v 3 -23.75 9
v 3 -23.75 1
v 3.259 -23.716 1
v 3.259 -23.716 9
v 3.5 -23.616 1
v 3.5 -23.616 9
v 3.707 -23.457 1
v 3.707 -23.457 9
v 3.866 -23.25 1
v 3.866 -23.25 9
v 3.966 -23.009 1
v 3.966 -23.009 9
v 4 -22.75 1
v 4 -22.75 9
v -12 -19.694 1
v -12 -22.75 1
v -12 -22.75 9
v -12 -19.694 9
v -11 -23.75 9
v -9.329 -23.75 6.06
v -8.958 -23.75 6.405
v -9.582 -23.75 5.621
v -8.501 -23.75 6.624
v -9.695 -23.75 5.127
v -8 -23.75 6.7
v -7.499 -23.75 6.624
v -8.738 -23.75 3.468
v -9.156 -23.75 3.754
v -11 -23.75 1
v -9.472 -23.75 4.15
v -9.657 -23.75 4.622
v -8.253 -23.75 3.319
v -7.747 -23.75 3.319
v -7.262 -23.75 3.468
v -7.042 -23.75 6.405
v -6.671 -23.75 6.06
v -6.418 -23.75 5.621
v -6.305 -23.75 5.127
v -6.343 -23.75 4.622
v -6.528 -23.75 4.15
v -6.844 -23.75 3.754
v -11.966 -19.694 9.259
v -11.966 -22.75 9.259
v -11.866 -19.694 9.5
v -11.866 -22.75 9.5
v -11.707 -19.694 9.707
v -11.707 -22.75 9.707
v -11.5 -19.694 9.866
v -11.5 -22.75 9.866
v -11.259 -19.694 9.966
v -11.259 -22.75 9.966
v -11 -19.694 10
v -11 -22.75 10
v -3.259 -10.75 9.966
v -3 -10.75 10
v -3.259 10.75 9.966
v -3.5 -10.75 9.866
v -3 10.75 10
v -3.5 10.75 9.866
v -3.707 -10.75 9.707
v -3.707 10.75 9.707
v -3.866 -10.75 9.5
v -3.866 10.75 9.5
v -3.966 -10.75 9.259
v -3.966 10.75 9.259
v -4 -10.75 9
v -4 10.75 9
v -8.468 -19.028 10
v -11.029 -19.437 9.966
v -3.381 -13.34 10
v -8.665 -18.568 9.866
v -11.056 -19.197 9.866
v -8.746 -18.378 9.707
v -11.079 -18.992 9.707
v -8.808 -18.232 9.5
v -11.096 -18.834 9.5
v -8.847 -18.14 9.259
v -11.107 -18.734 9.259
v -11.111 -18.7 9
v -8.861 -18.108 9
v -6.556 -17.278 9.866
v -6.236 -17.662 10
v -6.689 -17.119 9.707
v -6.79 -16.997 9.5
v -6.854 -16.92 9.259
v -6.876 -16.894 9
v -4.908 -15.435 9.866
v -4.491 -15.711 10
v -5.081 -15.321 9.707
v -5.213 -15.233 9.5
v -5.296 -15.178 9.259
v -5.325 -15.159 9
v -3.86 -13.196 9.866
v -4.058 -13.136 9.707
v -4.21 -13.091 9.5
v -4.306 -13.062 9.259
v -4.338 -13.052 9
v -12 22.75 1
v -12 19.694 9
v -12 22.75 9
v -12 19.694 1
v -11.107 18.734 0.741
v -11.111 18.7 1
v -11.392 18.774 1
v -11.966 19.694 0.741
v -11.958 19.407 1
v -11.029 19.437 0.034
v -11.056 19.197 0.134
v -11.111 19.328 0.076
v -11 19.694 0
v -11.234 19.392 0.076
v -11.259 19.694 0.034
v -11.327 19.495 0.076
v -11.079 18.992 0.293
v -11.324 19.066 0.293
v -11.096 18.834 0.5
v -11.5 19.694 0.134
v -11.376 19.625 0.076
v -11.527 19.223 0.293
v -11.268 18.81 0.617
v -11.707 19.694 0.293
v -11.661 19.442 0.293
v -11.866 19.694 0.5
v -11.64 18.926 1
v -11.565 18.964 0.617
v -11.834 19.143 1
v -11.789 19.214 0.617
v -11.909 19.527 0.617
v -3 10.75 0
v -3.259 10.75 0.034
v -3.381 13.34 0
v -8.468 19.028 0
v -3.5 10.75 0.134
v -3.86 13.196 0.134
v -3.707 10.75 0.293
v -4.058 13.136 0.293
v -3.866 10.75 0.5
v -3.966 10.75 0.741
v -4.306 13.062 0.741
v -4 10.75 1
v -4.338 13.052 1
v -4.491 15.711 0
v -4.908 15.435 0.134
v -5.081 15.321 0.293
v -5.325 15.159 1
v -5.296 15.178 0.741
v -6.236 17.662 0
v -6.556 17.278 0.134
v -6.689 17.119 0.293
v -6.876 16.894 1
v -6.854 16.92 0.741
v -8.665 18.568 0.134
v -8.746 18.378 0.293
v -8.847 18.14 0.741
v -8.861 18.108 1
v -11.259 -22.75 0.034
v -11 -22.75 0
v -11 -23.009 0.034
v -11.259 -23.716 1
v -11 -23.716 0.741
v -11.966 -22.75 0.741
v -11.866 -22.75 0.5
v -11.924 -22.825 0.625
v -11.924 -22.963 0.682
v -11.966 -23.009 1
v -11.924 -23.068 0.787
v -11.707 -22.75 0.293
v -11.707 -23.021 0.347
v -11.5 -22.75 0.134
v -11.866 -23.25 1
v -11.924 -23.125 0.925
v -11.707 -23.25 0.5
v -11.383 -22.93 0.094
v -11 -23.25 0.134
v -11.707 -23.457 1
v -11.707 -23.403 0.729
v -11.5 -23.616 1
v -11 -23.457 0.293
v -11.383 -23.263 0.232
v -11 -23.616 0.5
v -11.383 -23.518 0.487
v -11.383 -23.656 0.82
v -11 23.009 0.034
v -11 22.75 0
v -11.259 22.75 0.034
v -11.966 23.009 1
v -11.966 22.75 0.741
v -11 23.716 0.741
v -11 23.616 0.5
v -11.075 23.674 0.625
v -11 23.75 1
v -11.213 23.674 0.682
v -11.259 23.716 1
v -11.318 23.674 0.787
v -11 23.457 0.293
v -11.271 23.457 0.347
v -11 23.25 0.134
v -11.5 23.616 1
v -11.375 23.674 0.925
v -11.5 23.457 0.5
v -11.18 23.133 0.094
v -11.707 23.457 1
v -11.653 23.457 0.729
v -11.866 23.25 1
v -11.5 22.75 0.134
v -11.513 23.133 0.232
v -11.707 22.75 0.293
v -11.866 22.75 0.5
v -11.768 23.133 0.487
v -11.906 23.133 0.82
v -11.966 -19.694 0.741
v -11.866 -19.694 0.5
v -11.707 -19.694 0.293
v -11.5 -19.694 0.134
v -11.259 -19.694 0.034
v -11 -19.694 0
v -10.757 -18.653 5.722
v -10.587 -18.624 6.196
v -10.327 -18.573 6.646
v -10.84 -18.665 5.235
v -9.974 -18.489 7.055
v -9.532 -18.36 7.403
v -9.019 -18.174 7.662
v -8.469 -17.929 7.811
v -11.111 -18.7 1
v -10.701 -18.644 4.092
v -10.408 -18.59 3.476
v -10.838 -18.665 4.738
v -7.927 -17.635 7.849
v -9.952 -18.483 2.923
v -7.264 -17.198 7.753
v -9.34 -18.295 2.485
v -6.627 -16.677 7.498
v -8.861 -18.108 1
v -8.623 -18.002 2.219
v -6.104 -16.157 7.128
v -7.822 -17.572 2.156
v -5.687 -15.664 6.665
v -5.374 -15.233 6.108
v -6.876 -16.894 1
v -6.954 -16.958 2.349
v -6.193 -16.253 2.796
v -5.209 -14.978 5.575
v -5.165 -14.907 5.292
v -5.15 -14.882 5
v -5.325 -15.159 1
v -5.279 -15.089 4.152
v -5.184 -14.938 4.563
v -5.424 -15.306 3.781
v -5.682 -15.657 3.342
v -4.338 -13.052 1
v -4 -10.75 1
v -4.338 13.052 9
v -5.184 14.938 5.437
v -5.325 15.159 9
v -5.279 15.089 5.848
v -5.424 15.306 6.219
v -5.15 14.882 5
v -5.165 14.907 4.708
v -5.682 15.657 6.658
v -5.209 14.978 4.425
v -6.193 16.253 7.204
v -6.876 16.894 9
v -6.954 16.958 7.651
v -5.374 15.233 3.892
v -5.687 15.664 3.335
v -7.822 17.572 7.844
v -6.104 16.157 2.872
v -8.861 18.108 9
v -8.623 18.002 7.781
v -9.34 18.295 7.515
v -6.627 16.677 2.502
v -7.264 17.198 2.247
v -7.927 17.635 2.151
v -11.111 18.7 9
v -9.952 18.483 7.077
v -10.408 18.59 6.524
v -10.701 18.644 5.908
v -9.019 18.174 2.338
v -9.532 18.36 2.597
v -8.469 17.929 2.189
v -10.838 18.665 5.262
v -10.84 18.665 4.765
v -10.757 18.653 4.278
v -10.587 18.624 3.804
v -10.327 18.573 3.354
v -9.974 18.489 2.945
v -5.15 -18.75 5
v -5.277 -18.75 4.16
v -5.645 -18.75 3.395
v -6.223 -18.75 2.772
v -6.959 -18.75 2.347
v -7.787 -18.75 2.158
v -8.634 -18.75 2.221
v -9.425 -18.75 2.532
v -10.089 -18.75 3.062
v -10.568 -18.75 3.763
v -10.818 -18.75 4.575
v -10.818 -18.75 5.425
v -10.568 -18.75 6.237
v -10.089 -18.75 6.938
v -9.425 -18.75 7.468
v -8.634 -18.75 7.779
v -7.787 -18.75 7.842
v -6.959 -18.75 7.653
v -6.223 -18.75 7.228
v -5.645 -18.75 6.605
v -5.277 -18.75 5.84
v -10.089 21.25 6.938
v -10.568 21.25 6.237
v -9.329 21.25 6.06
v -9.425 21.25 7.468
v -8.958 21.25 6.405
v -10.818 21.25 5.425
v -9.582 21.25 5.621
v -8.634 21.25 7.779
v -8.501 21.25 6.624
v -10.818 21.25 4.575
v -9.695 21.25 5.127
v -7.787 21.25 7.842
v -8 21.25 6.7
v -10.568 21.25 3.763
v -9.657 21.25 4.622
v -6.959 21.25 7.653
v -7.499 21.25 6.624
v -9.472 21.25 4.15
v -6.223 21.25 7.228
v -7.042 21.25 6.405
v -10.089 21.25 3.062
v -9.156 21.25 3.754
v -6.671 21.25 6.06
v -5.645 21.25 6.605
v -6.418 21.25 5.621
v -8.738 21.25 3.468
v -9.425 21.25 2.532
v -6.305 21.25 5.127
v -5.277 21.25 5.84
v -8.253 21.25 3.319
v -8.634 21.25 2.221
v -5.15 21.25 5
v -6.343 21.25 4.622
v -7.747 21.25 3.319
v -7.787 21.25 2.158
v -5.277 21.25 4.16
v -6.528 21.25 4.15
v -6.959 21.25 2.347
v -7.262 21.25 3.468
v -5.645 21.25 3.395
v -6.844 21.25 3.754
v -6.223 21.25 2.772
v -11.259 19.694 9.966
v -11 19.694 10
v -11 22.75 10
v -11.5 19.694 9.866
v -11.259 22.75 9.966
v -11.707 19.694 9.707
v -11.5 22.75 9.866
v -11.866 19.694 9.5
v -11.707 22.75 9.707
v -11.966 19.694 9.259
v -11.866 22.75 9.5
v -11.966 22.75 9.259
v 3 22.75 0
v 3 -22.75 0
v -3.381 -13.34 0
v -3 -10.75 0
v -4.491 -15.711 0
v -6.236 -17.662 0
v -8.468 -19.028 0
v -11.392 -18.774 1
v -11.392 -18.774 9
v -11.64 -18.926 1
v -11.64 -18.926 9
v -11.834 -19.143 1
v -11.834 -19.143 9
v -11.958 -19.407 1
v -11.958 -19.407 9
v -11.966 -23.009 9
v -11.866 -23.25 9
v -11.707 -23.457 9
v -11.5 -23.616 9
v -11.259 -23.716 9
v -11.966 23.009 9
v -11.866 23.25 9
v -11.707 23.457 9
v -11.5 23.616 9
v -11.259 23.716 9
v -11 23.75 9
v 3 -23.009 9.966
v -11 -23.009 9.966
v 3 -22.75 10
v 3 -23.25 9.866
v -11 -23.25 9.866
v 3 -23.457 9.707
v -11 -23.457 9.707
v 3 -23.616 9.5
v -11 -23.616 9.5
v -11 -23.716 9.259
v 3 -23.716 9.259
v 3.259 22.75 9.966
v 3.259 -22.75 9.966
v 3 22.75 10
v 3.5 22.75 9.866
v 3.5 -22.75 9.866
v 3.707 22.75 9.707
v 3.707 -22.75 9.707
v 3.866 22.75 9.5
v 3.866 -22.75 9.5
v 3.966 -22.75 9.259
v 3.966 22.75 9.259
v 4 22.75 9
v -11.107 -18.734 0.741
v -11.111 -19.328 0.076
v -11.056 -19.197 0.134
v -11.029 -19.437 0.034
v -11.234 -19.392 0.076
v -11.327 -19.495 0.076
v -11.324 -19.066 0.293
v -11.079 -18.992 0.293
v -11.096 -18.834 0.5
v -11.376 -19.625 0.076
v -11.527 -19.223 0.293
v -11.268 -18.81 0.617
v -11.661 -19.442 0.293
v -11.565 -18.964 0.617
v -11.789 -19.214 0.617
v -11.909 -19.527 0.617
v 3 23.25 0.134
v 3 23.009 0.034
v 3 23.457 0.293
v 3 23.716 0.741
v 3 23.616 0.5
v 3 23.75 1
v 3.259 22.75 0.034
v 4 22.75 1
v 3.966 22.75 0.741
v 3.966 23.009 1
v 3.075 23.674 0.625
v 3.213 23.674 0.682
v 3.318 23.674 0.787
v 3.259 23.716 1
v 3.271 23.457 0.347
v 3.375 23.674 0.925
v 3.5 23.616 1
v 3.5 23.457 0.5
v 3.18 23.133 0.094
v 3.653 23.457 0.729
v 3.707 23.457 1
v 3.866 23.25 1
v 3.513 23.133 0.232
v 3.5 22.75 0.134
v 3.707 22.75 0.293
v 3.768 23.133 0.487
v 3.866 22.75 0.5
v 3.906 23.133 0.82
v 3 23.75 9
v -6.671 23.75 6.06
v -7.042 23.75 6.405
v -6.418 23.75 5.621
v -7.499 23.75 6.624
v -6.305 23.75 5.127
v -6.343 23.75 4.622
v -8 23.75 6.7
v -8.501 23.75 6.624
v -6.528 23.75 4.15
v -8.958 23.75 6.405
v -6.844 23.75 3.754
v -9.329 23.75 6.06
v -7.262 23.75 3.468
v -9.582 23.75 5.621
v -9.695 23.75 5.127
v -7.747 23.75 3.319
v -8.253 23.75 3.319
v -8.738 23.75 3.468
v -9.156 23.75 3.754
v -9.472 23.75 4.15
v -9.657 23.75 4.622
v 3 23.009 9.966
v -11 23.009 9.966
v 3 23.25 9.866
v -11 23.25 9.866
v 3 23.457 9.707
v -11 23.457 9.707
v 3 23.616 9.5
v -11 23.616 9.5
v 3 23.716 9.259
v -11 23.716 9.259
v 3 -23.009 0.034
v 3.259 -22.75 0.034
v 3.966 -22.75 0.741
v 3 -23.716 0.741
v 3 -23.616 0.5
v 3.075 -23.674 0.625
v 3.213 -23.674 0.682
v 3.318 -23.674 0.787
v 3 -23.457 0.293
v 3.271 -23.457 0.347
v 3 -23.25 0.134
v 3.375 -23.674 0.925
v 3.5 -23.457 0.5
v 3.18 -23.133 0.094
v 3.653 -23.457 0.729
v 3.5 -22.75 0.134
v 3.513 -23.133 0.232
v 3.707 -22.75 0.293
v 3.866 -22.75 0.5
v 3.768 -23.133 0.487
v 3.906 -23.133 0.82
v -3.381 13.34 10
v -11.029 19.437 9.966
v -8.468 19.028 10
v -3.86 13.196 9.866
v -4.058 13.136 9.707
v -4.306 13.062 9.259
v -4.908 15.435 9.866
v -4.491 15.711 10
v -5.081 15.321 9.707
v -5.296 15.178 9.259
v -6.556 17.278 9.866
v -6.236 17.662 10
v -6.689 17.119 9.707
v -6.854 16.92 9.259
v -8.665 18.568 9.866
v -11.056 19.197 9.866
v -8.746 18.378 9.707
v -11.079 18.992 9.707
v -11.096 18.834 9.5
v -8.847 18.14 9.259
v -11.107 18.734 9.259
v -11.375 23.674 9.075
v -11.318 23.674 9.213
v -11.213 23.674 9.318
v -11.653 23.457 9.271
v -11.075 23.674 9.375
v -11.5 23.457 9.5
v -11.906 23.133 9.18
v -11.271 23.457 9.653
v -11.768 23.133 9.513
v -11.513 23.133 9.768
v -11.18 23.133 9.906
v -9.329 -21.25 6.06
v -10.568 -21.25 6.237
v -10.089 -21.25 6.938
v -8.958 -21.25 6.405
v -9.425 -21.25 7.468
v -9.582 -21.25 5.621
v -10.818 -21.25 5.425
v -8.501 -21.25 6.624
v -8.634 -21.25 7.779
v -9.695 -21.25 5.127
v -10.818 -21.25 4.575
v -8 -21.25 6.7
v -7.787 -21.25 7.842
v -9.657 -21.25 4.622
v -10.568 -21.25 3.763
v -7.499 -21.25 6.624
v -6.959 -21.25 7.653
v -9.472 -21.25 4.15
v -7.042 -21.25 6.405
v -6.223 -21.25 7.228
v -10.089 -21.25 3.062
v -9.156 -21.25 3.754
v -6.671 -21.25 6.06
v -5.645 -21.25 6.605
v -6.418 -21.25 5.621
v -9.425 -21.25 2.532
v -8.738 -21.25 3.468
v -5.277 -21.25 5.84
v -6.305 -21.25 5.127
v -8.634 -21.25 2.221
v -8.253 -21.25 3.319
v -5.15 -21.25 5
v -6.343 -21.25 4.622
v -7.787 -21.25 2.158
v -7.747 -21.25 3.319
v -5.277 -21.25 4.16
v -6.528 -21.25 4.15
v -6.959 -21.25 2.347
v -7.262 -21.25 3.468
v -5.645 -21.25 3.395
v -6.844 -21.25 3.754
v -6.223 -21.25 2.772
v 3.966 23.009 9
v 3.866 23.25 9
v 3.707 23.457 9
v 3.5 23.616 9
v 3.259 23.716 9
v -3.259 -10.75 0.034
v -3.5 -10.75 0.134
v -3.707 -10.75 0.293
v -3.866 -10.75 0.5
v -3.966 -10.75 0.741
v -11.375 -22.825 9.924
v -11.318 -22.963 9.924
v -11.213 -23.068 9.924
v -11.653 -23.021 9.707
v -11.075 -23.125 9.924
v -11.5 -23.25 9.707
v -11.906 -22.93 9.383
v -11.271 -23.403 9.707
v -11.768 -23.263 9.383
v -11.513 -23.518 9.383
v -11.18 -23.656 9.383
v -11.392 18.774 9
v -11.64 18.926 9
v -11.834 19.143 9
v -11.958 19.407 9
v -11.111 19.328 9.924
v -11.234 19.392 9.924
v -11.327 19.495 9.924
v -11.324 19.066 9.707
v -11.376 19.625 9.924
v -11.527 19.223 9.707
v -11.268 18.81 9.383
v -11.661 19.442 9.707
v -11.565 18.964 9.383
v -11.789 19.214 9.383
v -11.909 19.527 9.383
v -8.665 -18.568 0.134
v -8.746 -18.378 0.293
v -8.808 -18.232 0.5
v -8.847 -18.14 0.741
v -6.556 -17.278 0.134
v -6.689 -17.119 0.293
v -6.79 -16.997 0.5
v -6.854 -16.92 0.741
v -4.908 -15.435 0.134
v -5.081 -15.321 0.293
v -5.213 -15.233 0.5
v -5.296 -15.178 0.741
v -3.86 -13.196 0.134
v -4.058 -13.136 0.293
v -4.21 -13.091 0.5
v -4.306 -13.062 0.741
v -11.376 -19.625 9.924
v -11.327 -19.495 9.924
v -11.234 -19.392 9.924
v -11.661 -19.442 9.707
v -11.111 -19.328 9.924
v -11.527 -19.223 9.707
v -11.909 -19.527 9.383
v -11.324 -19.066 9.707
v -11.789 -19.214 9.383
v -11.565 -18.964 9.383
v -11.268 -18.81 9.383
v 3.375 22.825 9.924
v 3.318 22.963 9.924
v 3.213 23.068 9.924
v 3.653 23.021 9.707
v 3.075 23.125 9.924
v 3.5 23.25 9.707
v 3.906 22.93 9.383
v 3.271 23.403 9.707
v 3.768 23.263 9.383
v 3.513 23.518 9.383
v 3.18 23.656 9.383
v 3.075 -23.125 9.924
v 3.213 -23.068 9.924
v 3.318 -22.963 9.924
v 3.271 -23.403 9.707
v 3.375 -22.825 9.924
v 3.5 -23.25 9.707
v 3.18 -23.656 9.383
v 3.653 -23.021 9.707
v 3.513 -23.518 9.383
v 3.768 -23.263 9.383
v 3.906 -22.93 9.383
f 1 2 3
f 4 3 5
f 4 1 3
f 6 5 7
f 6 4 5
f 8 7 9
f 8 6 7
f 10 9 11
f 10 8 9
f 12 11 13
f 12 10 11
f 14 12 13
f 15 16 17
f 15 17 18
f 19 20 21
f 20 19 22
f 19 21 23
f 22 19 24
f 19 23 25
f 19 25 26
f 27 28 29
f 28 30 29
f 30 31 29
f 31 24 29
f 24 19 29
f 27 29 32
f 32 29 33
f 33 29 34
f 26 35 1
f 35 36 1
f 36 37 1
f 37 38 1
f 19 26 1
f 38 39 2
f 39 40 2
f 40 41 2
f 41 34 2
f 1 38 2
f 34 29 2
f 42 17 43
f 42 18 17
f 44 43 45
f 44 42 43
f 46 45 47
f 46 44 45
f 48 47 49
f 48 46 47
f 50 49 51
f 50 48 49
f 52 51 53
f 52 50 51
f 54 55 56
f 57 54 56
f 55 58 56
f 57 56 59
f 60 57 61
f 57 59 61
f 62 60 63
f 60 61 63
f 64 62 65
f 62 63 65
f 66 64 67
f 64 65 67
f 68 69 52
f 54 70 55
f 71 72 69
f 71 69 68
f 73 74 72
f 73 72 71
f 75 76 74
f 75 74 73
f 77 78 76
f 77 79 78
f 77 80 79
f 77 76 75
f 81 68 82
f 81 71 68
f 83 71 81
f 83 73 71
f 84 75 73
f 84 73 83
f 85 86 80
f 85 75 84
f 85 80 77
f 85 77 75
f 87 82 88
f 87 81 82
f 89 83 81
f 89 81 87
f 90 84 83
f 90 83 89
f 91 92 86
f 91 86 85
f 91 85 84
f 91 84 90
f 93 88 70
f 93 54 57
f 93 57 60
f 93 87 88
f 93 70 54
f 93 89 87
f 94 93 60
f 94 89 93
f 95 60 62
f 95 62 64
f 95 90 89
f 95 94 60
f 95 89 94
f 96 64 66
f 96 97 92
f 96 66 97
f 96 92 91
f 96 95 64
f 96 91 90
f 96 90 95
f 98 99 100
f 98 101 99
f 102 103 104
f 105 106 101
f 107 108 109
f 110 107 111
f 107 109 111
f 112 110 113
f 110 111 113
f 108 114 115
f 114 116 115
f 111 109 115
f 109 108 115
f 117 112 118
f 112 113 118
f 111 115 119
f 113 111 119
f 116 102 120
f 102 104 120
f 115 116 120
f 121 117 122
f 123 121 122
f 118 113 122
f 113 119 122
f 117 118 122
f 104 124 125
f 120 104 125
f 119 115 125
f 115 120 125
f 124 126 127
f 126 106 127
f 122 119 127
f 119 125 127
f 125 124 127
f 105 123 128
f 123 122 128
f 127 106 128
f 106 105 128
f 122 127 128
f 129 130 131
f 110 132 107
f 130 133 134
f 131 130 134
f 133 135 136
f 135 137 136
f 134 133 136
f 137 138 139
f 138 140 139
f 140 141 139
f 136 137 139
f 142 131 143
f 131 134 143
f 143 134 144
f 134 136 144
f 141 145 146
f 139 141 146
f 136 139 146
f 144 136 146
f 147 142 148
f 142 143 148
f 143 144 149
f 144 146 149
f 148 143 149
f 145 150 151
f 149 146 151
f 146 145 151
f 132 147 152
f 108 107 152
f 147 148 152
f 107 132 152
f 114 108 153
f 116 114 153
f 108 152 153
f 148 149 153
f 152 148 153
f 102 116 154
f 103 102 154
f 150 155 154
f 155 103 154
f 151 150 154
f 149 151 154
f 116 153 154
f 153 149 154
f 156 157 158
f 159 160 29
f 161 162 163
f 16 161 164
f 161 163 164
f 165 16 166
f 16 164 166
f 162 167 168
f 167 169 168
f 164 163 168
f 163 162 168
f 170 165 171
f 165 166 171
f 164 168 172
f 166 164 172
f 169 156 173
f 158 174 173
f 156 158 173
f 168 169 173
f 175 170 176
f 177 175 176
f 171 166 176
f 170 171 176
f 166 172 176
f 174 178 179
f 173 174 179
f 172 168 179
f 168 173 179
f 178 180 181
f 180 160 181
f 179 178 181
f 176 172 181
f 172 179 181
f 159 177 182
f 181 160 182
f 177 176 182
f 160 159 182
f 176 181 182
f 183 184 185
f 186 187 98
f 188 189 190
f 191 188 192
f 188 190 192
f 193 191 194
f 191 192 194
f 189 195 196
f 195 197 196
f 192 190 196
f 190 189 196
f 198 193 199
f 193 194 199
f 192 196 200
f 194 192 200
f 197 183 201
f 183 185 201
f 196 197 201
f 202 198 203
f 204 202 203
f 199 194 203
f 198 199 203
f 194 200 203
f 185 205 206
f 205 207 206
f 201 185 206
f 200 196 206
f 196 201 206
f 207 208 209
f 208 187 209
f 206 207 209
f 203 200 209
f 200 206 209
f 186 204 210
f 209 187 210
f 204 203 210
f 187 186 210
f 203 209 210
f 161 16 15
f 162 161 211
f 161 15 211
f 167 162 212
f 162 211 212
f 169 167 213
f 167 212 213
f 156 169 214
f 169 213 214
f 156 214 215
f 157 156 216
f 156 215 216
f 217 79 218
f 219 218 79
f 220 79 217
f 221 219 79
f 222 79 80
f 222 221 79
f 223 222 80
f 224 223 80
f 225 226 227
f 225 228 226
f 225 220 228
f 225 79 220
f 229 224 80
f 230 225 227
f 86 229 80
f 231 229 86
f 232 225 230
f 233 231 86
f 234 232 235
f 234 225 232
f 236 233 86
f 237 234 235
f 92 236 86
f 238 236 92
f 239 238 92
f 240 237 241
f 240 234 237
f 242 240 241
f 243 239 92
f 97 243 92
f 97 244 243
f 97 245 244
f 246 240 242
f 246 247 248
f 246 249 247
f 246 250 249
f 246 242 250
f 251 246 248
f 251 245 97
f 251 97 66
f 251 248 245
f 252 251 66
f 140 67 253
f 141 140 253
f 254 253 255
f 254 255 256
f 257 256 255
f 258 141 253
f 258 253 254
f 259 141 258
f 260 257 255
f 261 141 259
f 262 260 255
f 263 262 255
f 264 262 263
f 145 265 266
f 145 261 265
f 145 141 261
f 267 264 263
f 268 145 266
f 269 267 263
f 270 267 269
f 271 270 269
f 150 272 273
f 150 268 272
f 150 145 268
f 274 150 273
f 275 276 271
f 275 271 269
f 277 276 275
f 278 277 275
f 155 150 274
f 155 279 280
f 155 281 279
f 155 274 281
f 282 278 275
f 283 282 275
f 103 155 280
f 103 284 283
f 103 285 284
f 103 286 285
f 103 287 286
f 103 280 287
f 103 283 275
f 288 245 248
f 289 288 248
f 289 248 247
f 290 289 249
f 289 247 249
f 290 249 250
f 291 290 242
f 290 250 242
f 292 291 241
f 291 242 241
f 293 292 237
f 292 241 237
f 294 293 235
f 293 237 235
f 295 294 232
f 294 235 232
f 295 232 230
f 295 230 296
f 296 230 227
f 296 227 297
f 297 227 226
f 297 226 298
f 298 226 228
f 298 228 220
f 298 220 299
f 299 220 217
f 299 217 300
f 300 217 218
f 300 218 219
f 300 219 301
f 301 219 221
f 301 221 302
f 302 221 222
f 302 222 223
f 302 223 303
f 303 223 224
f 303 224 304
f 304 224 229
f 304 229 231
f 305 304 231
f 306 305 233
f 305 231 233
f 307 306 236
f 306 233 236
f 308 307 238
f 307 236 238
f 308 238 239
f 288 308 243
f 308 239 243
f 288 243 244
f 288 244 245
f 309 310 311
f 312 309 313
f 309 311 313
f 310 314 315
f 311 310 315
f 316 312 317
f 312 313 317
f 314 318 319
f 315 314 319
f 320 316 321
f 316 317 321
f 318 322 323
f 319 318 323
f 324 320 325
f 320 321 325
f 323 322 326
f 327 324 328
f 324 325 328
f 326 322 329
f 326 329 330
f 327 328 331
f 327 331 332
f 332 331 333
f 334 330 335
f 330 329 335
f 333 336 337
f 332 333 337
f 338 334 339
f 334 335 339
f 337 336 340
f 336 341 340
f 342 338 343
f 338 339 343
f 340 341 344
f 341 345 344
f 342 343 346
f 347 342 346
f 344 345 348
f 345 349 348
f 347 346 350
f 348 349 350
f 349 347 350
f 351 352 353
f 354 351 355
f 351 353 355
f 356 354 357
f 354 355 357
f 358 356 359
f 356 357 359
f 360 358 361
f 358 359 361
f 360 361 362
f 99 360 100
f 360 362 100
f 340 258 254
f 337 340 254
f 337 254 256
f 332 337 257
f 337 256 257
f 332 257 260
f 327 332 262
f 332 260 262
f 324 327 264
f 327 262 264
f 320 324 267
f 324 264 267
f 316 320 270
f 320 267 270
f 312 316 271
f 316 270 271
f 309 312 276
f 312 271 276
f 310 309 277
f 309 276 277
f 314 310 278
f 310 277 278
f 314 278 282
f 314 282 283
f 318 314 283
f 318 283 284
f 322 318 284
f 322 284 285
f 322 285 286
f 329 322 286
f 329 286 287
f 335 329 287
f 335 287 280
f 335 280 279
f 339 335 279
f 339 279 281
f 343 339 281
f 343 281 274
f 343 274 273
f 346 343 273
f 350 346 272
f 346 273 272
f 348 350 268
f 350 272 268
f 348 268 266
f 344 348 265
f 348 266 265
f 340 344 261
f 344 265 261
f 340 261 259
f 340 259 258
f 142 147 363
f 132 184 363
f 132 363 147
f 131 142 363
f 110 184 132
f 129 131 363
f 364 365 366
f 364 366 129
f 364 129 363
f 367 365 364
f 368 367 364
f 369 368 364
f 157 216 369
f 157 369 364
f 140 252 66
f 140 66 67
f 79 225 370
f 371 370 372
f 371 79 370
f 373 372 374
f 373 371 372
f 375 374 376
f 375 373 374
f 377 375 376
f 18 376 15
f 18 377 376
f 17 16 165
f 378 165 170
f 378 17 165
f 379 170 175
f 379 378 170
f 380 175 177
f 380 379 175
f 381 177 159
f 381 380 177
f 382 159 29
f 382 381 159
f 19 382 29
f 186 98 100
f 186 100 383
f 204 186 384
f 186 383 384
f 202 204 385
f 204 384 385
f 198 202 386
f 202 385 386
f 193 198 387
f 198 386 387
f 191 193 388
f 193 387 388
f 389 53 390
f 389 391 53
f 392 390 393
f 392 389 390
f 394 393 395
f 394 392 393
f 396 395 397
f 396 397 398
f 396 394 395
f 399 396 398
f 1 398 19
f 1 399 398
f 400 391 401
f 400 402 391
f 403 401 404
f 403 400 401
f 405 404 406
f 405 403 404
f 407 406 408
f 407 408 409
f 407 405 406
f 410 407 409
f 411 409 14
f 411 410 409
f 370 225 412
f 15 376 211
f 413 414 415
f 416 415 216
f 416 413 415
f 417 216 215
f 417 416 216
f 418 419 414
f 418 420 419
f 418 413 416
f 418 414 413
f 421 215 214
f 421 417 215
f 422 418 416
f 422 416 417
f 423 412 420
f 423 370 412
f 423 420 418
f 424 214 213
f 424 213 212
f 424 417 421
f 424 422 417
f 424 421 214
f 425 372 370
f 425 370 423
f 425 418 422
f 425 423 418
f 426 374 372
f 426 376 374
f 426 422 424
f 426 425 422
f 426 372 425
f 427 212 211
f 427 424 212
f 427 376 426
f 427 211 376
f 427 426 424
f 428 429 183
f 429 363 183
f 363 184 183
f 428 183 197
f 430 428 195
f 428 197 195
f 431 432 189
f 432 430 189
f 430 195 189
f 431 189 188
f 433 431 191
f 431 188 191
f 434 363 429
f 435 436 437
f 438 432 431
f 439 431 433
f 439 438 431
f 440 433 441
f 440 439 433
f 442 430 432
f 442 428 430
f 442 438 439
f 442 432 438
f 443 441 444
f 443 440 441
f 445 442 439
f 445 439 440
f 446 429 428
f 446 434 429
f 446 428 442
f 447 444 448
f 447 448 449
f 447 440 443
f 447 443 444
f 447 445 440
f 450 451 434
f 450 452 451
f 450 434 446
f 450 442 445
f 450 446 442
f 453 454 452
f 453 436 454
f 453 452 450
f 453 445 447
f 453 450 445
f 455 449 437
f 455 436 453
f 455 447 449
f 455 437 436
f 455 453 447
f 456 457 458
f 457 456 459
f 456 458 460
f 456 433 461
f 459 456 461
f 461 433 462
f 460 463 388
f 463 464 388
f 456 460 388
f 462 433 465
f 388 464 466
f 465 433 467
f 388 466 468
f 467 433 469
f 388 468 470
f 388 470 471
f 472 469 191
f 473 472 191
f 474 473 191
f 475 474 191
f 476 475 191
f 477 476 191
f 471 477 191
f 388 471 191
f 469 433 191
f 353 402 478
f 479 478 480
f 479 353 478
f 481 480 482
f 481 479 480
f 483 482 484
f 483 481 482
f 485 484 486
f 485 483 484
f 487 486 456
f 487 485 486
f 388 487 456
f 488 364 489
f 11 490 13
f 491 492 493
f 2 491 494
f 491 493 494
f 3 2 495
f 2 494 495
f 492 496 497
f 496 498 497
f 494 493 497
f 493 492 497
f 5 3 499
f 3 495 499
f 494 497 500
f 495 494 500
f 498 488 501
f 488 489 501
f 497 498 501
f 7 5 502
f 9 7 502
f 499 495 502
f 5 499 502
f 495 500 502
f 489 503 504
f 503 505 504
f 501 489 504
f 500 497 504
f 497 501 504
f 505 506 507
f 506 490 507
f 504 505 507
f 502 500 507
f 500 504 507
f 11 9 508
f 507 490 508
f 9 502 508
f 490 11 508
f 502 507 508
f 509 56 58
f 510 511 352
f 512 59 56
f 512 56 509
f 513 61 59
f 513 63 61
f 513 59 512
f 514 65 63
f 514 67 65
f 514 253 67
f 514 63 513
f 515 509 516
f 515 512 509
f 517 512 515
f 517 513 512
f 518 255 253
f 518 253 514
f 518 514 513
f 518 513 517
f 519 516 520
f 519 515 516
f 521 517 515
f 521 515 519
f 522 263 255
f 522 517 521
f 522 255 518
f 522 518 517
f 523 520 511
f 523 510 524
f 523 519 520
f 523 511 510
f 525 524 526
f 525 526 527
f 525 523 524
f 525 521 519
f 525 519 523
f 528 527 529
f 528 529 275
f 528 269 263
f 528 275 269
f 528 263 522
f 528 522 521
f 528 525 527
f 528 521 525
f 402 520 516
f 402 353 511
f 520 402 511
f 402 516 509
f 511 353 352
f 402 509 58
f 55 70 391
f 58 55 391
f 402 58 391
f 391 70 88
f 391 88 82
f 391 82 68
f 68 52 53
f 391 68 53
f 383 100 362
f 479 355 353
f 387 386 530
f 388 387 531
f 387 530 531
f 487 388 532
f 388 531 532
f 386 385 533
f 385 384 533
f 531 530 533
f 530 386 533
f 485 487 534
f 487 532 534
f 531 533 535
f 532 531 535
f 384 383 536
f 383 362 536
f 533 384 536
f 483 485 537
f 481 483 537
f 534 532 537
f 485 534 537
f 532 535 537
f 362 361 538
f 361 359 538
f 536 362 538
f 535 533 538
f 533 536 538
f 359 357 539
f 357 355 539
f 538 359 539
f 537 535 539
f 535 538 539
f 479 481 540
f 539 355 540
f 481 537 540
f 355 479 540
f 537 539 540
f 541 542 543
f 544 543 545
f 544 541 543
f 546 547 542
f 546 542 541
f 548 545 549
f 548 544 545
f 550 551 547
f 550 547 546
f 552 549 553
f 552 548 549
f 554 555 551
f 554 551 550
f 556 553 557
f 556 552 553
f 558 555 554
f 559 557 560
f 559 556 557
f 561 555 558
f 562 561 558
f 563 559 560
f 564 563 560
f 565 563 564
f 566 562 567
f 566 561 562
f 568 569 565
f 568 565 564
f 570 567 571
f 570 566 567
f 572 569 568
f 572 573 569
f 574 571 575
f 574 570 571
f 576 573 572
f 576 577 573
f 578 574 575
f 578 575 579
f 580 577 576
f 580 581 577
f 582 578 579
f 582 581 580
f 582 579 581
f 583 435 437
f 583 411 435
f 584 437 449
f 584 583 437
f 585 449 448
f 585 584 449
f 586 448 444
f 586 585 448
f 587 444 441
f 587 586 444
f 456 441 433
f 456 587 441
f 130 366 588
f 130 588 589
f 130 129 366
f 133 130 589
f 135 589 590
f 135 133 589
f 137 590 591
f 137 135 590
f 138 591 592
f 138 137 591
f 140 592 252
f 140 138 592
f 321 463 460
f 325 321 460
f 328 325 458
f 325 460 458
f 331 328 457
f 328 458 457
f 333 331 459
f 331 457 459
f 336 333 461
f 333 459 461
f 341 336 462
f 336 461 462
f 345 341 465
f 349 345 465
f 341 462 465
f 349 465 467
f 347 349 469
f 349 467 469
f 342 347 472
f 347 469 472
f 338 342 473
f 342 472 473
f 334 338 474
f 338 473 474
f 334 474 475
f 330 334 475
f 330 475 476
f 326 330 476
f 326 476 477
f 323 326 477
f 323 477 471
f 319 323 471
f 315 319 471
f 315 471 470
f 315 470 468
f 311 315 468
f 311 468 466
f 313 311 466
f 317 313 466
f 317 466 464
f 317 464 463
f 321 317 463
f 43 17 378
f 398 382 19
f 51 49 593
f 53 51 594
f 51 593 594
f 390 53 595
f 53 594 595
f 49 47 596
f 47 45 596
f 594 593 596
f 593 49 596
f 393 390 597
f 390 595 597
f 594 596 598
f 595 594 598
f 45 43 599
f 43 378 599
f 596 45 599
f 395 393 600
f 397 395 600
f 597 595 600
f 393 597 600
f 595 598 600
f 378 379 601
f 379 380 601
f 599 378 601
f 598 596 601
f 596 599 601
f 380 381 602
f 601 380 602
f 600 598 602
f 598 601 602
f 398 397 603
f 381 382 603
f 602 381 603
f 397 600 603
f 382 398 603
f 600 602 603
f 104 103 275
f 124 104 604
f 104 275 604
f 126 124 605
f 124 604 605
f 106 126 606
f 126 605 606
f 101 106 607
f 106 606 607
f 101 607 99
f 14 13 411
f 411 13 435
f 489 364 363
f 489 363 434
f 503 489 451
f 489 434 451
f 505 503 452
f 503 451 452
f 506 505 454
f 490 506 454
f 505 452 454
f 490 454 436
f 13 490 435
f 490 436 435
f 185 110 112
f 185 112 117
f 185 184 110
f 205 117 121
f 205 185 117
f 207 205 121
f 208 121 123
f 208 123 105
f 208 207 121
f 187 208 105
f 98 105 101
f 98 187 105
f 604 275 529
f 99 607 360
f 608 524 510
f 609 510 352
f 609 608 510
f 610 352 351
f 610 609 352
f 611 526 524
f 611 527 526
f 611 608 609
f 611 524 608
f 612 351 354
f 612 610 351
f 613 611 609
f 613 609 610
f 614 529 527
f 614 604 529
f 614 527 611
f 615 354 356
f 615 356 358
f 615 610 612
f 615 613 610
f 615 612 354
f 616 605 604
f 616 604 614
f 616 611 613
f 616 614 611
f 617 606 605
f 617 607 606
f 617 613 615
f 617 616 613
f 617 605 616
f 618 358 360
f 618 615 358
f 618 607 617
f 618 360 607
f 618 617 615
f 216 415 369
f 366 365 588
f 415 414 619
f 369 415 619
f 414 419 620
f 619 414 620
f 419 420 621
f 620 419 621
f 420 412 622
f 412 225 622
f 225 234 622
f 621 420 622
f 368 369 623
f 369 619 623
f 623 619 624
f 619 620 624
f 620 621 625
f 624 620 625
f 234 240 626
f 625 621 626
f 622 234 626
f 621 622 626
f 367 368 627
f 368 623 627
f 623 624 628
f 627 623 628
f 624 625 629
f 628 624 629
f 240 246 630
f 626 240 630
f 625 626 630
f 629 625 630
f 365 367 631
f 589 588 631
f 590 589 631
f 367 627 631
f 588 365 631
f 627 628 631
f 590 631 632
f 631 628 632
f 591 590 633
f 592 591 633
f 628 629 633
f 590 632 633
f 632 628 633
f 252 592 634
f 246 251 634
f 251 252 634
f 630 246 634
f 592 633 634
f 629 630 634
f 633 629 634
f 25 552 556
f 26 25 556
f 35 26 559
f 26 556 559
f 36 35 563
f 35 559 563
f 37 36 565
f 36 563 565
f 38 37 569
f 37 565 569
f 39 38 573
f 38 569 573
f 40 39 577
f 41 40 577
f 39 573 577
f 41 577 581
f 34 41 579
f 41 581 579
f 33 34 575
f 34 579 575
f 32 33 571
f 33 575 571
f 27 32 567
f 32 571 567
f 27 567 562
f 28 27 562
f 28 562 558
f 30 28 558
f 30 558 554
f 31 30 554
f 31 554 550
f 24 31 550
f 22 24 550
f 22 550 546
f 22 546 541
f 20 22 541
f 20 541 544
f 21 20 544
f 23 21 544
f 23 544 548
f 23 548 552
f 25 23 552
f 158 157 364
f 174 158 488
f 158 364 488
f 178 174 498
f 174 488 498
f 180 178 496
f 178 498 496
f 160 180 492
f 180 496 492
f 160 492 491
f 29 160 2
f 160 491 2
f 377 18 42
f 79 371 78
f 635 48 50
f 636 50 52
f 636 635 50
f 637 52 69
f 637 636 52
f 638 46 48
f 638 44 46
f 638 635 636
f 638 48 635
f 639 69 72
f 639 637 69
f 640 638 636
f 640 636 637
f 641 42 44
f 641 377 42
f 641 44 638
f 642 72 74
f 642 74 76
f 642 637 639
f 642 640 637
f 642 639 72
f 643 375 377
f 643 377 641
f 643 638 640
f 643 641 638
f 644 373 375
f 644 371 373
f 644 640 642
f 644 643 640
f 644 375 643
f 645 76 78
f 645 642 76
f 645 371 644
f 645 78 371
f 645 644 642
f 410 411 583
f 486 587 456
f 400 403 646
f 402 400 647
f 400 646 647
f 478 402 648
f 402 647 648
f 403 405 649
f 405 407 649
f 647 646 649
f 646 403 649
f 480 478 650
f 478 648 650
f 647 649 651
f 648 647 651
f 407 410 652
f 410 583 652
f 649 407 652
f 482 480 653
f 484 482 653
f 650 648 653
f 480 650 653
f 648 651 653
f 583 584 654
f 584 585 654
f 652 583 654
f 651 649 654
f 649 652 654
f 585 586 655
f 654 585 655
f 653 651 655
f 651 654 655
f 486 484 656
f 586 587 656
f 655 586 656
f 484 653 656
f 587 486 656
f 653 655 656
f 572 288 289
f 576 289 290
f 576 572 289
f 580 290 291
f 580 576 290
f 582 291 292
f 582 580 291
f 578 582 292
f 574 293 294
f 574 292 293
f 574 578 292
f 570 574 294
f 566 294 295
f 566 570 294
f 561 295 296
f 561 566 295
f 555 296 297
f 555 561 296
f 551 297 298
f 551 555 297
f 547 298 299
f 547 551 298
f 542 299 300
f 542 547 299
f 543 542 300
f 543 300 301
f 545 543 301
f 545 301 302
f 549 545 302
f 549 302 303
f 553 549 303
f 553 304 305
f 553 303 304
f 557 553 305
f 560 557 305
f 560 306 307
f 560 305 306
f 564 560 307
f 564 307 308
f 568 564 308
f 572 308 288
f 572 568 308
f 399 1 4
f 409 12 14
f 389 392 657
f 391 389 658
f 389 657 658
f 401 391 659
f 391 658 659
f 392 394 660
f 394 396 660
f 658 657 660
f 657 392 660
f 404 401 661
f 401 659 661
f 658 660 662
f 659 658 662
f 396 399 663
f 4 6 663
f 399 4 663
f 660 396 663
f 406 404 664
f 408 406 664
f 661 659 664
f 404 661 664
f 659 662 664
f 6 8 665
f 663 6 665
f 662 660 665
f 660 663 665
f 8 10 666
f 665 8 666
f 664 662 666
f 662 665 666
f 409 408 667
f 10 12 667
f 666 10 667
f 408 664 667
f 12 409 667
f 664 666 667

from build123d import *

# Parameters (mm, degrees)
SKETCH1_W               = 8
SKETCH1_H               = 5
SKETCH1_H_2             = 47.5
BOSS_EXTRUDE1_DEPTH     = 10
SKETCH2_R               = 1.7
CUT_EXTRUDE1_DEPTH      = 51.002499938
CUT_EXTRUDE2_DEPTH      = 40
CUT_EXTRUDE2_DEPTH_BACK = 2.5
SKETCH3_R               = 2.85
FILLET1_R               = 8
FILLET2_R               = 1


with BuildPart() as part:
    # Sketch1 → Boss-Extrude1 (new body)
    with BuildSketch(Plane.XY):
        with Locations((-8, 21.25)):
            Rectangle(SKETCH1_W, SKETCH1_H)
        Rectangle(SKETCH1_W, SKETCH1_H_2)
        with Locations((-8, -21.25)):
            Rectangle(SKETCH1_W, SKETCH1_H)
    extrude(amount=BOSS_EXTRUDE1_DEPTH)

    # Sketch2 → Cut-Extrude1 (cut, through all)
    with BuildSketch(Plane(origin=(0, 23.75, 0), x_dir=(1, 0, 0), z_dir=(0, 1, 0))):
        with Locations(Location((-8, -5, 0), (0, 0, 270))):
            Circle(SKETCH2_R)
    extrude(amount=-CUT_EXTRUDE1_DEPTH, mode=Mode.SUBTRACT)

    # Sketch3 → Cut-Extrude2 (cut, two sides: drawn at the far end of the back side and taken through both)
    with BuildSketch(Plane(origin=(0, -18.75, 0), x_dir=(1, 0, 0), z_dir=(0, 1, 0)).offset(-CUT_EXTRUDE2_DEPTH_BACK)):
        with Locations((-8, -5)):
            Circle(SKETCH3_R)
    extrude(amount=CUT_EXTRUDE2_DEPTH + CUT_EXTRUDE2_DEPTH_BACK, mode=Mode.SUBTRACT)

    # Fillet1
    # the kernel refuses this fillet: 8 mm, written as the material it adds along each edge
    with BuildSketch(Plane(origin=(-4, 18.75, 0), x_dir=(-1, 0, 0), z_dir=(0, 0, 1))) as fillet1_piece_1_section:
        with BuildLine():
            CenterArc((FILLET1_R, FILLET1_R), FILLET1_R, 180, 90)
            Line((0, FILLET1_R), (0, 0))
            Line((0, 0), (FILLET1_R, 0))
        make_face()
    fillet1_piece_1 = extrude(amount=10, mode=Mode.PRIVATE)
    fillet1_piece_1 = fillet1_piece_1 - Plane(origin=(-8, 18.525887701, 5), x_dir=(1, 0, 0), z_dir=(0, -1, 0)) * Cylinder(2.85, 53, mode=Mode.PRIVATE)
    add(fillet1_piece_1)
    with BuildSketch(Plane(origin=(-4, -18.75, 0), x_dir=(0, 1, 0), z_dir=(0, 0, 1))) as fillet1_piece_2_section:
        with BuildLine():
            CenterArc((FILLET1_R, FILLET1_R), FILLET1_R, 180, 90)
            Line((0, FILLET1_R), (0, 0))
            Line((0, 0), (FILLET1_R, 0))
        make_face()
    fillet1_piece_2 = extrude(amount=10, mode=Mode.PRIVATE)
    fillet1_piece_2 = fillet1_piece_2 - Plane(origin=(-8, -12.833542895, 5), x_dir=(1, 0, 0), z_dir=(0, 1, 0)) * Cylinder(2.85, 53, mode=Mode.PRIVATE)
    add(fillet1_piece_2)

    # Fillet2
    fillet2_edges = [part.edges().sort_by_distance(p)[0] for p in [
        (4, 0, 0),
        (-4, -23.75, 0),
        (-12, -21.25, 0),
        (-12, 21.25, 10),
        (-12, 21.25, 0),
        (-4, 23.75, 0),
        (4, 23.75, 5),
        (4, -23.75, 5),
        (-12, -23.75, 5),
        (-12, -18.75, 5),
        (-12, 18.75, 5),
        (-12, 23.75, 5),
        (-12, -21.25, 10),
        (-4, -23.75, 10),
        (4, 0, 10),
        (-4, 23.75, 10),
        (-4, 0, 0),
        (-4, 0, 10),
        (-6.343145751, 16.406854249, 0),
        (-6.343145751, 16.406854249, 10),
        (-6.343145751, -16.406854249, 0),
        (-6.343145751, -16.406854249, 10),
    ]]
    fillet(fillet2_edges, radius=FILLET2_R)


solid = part.part
